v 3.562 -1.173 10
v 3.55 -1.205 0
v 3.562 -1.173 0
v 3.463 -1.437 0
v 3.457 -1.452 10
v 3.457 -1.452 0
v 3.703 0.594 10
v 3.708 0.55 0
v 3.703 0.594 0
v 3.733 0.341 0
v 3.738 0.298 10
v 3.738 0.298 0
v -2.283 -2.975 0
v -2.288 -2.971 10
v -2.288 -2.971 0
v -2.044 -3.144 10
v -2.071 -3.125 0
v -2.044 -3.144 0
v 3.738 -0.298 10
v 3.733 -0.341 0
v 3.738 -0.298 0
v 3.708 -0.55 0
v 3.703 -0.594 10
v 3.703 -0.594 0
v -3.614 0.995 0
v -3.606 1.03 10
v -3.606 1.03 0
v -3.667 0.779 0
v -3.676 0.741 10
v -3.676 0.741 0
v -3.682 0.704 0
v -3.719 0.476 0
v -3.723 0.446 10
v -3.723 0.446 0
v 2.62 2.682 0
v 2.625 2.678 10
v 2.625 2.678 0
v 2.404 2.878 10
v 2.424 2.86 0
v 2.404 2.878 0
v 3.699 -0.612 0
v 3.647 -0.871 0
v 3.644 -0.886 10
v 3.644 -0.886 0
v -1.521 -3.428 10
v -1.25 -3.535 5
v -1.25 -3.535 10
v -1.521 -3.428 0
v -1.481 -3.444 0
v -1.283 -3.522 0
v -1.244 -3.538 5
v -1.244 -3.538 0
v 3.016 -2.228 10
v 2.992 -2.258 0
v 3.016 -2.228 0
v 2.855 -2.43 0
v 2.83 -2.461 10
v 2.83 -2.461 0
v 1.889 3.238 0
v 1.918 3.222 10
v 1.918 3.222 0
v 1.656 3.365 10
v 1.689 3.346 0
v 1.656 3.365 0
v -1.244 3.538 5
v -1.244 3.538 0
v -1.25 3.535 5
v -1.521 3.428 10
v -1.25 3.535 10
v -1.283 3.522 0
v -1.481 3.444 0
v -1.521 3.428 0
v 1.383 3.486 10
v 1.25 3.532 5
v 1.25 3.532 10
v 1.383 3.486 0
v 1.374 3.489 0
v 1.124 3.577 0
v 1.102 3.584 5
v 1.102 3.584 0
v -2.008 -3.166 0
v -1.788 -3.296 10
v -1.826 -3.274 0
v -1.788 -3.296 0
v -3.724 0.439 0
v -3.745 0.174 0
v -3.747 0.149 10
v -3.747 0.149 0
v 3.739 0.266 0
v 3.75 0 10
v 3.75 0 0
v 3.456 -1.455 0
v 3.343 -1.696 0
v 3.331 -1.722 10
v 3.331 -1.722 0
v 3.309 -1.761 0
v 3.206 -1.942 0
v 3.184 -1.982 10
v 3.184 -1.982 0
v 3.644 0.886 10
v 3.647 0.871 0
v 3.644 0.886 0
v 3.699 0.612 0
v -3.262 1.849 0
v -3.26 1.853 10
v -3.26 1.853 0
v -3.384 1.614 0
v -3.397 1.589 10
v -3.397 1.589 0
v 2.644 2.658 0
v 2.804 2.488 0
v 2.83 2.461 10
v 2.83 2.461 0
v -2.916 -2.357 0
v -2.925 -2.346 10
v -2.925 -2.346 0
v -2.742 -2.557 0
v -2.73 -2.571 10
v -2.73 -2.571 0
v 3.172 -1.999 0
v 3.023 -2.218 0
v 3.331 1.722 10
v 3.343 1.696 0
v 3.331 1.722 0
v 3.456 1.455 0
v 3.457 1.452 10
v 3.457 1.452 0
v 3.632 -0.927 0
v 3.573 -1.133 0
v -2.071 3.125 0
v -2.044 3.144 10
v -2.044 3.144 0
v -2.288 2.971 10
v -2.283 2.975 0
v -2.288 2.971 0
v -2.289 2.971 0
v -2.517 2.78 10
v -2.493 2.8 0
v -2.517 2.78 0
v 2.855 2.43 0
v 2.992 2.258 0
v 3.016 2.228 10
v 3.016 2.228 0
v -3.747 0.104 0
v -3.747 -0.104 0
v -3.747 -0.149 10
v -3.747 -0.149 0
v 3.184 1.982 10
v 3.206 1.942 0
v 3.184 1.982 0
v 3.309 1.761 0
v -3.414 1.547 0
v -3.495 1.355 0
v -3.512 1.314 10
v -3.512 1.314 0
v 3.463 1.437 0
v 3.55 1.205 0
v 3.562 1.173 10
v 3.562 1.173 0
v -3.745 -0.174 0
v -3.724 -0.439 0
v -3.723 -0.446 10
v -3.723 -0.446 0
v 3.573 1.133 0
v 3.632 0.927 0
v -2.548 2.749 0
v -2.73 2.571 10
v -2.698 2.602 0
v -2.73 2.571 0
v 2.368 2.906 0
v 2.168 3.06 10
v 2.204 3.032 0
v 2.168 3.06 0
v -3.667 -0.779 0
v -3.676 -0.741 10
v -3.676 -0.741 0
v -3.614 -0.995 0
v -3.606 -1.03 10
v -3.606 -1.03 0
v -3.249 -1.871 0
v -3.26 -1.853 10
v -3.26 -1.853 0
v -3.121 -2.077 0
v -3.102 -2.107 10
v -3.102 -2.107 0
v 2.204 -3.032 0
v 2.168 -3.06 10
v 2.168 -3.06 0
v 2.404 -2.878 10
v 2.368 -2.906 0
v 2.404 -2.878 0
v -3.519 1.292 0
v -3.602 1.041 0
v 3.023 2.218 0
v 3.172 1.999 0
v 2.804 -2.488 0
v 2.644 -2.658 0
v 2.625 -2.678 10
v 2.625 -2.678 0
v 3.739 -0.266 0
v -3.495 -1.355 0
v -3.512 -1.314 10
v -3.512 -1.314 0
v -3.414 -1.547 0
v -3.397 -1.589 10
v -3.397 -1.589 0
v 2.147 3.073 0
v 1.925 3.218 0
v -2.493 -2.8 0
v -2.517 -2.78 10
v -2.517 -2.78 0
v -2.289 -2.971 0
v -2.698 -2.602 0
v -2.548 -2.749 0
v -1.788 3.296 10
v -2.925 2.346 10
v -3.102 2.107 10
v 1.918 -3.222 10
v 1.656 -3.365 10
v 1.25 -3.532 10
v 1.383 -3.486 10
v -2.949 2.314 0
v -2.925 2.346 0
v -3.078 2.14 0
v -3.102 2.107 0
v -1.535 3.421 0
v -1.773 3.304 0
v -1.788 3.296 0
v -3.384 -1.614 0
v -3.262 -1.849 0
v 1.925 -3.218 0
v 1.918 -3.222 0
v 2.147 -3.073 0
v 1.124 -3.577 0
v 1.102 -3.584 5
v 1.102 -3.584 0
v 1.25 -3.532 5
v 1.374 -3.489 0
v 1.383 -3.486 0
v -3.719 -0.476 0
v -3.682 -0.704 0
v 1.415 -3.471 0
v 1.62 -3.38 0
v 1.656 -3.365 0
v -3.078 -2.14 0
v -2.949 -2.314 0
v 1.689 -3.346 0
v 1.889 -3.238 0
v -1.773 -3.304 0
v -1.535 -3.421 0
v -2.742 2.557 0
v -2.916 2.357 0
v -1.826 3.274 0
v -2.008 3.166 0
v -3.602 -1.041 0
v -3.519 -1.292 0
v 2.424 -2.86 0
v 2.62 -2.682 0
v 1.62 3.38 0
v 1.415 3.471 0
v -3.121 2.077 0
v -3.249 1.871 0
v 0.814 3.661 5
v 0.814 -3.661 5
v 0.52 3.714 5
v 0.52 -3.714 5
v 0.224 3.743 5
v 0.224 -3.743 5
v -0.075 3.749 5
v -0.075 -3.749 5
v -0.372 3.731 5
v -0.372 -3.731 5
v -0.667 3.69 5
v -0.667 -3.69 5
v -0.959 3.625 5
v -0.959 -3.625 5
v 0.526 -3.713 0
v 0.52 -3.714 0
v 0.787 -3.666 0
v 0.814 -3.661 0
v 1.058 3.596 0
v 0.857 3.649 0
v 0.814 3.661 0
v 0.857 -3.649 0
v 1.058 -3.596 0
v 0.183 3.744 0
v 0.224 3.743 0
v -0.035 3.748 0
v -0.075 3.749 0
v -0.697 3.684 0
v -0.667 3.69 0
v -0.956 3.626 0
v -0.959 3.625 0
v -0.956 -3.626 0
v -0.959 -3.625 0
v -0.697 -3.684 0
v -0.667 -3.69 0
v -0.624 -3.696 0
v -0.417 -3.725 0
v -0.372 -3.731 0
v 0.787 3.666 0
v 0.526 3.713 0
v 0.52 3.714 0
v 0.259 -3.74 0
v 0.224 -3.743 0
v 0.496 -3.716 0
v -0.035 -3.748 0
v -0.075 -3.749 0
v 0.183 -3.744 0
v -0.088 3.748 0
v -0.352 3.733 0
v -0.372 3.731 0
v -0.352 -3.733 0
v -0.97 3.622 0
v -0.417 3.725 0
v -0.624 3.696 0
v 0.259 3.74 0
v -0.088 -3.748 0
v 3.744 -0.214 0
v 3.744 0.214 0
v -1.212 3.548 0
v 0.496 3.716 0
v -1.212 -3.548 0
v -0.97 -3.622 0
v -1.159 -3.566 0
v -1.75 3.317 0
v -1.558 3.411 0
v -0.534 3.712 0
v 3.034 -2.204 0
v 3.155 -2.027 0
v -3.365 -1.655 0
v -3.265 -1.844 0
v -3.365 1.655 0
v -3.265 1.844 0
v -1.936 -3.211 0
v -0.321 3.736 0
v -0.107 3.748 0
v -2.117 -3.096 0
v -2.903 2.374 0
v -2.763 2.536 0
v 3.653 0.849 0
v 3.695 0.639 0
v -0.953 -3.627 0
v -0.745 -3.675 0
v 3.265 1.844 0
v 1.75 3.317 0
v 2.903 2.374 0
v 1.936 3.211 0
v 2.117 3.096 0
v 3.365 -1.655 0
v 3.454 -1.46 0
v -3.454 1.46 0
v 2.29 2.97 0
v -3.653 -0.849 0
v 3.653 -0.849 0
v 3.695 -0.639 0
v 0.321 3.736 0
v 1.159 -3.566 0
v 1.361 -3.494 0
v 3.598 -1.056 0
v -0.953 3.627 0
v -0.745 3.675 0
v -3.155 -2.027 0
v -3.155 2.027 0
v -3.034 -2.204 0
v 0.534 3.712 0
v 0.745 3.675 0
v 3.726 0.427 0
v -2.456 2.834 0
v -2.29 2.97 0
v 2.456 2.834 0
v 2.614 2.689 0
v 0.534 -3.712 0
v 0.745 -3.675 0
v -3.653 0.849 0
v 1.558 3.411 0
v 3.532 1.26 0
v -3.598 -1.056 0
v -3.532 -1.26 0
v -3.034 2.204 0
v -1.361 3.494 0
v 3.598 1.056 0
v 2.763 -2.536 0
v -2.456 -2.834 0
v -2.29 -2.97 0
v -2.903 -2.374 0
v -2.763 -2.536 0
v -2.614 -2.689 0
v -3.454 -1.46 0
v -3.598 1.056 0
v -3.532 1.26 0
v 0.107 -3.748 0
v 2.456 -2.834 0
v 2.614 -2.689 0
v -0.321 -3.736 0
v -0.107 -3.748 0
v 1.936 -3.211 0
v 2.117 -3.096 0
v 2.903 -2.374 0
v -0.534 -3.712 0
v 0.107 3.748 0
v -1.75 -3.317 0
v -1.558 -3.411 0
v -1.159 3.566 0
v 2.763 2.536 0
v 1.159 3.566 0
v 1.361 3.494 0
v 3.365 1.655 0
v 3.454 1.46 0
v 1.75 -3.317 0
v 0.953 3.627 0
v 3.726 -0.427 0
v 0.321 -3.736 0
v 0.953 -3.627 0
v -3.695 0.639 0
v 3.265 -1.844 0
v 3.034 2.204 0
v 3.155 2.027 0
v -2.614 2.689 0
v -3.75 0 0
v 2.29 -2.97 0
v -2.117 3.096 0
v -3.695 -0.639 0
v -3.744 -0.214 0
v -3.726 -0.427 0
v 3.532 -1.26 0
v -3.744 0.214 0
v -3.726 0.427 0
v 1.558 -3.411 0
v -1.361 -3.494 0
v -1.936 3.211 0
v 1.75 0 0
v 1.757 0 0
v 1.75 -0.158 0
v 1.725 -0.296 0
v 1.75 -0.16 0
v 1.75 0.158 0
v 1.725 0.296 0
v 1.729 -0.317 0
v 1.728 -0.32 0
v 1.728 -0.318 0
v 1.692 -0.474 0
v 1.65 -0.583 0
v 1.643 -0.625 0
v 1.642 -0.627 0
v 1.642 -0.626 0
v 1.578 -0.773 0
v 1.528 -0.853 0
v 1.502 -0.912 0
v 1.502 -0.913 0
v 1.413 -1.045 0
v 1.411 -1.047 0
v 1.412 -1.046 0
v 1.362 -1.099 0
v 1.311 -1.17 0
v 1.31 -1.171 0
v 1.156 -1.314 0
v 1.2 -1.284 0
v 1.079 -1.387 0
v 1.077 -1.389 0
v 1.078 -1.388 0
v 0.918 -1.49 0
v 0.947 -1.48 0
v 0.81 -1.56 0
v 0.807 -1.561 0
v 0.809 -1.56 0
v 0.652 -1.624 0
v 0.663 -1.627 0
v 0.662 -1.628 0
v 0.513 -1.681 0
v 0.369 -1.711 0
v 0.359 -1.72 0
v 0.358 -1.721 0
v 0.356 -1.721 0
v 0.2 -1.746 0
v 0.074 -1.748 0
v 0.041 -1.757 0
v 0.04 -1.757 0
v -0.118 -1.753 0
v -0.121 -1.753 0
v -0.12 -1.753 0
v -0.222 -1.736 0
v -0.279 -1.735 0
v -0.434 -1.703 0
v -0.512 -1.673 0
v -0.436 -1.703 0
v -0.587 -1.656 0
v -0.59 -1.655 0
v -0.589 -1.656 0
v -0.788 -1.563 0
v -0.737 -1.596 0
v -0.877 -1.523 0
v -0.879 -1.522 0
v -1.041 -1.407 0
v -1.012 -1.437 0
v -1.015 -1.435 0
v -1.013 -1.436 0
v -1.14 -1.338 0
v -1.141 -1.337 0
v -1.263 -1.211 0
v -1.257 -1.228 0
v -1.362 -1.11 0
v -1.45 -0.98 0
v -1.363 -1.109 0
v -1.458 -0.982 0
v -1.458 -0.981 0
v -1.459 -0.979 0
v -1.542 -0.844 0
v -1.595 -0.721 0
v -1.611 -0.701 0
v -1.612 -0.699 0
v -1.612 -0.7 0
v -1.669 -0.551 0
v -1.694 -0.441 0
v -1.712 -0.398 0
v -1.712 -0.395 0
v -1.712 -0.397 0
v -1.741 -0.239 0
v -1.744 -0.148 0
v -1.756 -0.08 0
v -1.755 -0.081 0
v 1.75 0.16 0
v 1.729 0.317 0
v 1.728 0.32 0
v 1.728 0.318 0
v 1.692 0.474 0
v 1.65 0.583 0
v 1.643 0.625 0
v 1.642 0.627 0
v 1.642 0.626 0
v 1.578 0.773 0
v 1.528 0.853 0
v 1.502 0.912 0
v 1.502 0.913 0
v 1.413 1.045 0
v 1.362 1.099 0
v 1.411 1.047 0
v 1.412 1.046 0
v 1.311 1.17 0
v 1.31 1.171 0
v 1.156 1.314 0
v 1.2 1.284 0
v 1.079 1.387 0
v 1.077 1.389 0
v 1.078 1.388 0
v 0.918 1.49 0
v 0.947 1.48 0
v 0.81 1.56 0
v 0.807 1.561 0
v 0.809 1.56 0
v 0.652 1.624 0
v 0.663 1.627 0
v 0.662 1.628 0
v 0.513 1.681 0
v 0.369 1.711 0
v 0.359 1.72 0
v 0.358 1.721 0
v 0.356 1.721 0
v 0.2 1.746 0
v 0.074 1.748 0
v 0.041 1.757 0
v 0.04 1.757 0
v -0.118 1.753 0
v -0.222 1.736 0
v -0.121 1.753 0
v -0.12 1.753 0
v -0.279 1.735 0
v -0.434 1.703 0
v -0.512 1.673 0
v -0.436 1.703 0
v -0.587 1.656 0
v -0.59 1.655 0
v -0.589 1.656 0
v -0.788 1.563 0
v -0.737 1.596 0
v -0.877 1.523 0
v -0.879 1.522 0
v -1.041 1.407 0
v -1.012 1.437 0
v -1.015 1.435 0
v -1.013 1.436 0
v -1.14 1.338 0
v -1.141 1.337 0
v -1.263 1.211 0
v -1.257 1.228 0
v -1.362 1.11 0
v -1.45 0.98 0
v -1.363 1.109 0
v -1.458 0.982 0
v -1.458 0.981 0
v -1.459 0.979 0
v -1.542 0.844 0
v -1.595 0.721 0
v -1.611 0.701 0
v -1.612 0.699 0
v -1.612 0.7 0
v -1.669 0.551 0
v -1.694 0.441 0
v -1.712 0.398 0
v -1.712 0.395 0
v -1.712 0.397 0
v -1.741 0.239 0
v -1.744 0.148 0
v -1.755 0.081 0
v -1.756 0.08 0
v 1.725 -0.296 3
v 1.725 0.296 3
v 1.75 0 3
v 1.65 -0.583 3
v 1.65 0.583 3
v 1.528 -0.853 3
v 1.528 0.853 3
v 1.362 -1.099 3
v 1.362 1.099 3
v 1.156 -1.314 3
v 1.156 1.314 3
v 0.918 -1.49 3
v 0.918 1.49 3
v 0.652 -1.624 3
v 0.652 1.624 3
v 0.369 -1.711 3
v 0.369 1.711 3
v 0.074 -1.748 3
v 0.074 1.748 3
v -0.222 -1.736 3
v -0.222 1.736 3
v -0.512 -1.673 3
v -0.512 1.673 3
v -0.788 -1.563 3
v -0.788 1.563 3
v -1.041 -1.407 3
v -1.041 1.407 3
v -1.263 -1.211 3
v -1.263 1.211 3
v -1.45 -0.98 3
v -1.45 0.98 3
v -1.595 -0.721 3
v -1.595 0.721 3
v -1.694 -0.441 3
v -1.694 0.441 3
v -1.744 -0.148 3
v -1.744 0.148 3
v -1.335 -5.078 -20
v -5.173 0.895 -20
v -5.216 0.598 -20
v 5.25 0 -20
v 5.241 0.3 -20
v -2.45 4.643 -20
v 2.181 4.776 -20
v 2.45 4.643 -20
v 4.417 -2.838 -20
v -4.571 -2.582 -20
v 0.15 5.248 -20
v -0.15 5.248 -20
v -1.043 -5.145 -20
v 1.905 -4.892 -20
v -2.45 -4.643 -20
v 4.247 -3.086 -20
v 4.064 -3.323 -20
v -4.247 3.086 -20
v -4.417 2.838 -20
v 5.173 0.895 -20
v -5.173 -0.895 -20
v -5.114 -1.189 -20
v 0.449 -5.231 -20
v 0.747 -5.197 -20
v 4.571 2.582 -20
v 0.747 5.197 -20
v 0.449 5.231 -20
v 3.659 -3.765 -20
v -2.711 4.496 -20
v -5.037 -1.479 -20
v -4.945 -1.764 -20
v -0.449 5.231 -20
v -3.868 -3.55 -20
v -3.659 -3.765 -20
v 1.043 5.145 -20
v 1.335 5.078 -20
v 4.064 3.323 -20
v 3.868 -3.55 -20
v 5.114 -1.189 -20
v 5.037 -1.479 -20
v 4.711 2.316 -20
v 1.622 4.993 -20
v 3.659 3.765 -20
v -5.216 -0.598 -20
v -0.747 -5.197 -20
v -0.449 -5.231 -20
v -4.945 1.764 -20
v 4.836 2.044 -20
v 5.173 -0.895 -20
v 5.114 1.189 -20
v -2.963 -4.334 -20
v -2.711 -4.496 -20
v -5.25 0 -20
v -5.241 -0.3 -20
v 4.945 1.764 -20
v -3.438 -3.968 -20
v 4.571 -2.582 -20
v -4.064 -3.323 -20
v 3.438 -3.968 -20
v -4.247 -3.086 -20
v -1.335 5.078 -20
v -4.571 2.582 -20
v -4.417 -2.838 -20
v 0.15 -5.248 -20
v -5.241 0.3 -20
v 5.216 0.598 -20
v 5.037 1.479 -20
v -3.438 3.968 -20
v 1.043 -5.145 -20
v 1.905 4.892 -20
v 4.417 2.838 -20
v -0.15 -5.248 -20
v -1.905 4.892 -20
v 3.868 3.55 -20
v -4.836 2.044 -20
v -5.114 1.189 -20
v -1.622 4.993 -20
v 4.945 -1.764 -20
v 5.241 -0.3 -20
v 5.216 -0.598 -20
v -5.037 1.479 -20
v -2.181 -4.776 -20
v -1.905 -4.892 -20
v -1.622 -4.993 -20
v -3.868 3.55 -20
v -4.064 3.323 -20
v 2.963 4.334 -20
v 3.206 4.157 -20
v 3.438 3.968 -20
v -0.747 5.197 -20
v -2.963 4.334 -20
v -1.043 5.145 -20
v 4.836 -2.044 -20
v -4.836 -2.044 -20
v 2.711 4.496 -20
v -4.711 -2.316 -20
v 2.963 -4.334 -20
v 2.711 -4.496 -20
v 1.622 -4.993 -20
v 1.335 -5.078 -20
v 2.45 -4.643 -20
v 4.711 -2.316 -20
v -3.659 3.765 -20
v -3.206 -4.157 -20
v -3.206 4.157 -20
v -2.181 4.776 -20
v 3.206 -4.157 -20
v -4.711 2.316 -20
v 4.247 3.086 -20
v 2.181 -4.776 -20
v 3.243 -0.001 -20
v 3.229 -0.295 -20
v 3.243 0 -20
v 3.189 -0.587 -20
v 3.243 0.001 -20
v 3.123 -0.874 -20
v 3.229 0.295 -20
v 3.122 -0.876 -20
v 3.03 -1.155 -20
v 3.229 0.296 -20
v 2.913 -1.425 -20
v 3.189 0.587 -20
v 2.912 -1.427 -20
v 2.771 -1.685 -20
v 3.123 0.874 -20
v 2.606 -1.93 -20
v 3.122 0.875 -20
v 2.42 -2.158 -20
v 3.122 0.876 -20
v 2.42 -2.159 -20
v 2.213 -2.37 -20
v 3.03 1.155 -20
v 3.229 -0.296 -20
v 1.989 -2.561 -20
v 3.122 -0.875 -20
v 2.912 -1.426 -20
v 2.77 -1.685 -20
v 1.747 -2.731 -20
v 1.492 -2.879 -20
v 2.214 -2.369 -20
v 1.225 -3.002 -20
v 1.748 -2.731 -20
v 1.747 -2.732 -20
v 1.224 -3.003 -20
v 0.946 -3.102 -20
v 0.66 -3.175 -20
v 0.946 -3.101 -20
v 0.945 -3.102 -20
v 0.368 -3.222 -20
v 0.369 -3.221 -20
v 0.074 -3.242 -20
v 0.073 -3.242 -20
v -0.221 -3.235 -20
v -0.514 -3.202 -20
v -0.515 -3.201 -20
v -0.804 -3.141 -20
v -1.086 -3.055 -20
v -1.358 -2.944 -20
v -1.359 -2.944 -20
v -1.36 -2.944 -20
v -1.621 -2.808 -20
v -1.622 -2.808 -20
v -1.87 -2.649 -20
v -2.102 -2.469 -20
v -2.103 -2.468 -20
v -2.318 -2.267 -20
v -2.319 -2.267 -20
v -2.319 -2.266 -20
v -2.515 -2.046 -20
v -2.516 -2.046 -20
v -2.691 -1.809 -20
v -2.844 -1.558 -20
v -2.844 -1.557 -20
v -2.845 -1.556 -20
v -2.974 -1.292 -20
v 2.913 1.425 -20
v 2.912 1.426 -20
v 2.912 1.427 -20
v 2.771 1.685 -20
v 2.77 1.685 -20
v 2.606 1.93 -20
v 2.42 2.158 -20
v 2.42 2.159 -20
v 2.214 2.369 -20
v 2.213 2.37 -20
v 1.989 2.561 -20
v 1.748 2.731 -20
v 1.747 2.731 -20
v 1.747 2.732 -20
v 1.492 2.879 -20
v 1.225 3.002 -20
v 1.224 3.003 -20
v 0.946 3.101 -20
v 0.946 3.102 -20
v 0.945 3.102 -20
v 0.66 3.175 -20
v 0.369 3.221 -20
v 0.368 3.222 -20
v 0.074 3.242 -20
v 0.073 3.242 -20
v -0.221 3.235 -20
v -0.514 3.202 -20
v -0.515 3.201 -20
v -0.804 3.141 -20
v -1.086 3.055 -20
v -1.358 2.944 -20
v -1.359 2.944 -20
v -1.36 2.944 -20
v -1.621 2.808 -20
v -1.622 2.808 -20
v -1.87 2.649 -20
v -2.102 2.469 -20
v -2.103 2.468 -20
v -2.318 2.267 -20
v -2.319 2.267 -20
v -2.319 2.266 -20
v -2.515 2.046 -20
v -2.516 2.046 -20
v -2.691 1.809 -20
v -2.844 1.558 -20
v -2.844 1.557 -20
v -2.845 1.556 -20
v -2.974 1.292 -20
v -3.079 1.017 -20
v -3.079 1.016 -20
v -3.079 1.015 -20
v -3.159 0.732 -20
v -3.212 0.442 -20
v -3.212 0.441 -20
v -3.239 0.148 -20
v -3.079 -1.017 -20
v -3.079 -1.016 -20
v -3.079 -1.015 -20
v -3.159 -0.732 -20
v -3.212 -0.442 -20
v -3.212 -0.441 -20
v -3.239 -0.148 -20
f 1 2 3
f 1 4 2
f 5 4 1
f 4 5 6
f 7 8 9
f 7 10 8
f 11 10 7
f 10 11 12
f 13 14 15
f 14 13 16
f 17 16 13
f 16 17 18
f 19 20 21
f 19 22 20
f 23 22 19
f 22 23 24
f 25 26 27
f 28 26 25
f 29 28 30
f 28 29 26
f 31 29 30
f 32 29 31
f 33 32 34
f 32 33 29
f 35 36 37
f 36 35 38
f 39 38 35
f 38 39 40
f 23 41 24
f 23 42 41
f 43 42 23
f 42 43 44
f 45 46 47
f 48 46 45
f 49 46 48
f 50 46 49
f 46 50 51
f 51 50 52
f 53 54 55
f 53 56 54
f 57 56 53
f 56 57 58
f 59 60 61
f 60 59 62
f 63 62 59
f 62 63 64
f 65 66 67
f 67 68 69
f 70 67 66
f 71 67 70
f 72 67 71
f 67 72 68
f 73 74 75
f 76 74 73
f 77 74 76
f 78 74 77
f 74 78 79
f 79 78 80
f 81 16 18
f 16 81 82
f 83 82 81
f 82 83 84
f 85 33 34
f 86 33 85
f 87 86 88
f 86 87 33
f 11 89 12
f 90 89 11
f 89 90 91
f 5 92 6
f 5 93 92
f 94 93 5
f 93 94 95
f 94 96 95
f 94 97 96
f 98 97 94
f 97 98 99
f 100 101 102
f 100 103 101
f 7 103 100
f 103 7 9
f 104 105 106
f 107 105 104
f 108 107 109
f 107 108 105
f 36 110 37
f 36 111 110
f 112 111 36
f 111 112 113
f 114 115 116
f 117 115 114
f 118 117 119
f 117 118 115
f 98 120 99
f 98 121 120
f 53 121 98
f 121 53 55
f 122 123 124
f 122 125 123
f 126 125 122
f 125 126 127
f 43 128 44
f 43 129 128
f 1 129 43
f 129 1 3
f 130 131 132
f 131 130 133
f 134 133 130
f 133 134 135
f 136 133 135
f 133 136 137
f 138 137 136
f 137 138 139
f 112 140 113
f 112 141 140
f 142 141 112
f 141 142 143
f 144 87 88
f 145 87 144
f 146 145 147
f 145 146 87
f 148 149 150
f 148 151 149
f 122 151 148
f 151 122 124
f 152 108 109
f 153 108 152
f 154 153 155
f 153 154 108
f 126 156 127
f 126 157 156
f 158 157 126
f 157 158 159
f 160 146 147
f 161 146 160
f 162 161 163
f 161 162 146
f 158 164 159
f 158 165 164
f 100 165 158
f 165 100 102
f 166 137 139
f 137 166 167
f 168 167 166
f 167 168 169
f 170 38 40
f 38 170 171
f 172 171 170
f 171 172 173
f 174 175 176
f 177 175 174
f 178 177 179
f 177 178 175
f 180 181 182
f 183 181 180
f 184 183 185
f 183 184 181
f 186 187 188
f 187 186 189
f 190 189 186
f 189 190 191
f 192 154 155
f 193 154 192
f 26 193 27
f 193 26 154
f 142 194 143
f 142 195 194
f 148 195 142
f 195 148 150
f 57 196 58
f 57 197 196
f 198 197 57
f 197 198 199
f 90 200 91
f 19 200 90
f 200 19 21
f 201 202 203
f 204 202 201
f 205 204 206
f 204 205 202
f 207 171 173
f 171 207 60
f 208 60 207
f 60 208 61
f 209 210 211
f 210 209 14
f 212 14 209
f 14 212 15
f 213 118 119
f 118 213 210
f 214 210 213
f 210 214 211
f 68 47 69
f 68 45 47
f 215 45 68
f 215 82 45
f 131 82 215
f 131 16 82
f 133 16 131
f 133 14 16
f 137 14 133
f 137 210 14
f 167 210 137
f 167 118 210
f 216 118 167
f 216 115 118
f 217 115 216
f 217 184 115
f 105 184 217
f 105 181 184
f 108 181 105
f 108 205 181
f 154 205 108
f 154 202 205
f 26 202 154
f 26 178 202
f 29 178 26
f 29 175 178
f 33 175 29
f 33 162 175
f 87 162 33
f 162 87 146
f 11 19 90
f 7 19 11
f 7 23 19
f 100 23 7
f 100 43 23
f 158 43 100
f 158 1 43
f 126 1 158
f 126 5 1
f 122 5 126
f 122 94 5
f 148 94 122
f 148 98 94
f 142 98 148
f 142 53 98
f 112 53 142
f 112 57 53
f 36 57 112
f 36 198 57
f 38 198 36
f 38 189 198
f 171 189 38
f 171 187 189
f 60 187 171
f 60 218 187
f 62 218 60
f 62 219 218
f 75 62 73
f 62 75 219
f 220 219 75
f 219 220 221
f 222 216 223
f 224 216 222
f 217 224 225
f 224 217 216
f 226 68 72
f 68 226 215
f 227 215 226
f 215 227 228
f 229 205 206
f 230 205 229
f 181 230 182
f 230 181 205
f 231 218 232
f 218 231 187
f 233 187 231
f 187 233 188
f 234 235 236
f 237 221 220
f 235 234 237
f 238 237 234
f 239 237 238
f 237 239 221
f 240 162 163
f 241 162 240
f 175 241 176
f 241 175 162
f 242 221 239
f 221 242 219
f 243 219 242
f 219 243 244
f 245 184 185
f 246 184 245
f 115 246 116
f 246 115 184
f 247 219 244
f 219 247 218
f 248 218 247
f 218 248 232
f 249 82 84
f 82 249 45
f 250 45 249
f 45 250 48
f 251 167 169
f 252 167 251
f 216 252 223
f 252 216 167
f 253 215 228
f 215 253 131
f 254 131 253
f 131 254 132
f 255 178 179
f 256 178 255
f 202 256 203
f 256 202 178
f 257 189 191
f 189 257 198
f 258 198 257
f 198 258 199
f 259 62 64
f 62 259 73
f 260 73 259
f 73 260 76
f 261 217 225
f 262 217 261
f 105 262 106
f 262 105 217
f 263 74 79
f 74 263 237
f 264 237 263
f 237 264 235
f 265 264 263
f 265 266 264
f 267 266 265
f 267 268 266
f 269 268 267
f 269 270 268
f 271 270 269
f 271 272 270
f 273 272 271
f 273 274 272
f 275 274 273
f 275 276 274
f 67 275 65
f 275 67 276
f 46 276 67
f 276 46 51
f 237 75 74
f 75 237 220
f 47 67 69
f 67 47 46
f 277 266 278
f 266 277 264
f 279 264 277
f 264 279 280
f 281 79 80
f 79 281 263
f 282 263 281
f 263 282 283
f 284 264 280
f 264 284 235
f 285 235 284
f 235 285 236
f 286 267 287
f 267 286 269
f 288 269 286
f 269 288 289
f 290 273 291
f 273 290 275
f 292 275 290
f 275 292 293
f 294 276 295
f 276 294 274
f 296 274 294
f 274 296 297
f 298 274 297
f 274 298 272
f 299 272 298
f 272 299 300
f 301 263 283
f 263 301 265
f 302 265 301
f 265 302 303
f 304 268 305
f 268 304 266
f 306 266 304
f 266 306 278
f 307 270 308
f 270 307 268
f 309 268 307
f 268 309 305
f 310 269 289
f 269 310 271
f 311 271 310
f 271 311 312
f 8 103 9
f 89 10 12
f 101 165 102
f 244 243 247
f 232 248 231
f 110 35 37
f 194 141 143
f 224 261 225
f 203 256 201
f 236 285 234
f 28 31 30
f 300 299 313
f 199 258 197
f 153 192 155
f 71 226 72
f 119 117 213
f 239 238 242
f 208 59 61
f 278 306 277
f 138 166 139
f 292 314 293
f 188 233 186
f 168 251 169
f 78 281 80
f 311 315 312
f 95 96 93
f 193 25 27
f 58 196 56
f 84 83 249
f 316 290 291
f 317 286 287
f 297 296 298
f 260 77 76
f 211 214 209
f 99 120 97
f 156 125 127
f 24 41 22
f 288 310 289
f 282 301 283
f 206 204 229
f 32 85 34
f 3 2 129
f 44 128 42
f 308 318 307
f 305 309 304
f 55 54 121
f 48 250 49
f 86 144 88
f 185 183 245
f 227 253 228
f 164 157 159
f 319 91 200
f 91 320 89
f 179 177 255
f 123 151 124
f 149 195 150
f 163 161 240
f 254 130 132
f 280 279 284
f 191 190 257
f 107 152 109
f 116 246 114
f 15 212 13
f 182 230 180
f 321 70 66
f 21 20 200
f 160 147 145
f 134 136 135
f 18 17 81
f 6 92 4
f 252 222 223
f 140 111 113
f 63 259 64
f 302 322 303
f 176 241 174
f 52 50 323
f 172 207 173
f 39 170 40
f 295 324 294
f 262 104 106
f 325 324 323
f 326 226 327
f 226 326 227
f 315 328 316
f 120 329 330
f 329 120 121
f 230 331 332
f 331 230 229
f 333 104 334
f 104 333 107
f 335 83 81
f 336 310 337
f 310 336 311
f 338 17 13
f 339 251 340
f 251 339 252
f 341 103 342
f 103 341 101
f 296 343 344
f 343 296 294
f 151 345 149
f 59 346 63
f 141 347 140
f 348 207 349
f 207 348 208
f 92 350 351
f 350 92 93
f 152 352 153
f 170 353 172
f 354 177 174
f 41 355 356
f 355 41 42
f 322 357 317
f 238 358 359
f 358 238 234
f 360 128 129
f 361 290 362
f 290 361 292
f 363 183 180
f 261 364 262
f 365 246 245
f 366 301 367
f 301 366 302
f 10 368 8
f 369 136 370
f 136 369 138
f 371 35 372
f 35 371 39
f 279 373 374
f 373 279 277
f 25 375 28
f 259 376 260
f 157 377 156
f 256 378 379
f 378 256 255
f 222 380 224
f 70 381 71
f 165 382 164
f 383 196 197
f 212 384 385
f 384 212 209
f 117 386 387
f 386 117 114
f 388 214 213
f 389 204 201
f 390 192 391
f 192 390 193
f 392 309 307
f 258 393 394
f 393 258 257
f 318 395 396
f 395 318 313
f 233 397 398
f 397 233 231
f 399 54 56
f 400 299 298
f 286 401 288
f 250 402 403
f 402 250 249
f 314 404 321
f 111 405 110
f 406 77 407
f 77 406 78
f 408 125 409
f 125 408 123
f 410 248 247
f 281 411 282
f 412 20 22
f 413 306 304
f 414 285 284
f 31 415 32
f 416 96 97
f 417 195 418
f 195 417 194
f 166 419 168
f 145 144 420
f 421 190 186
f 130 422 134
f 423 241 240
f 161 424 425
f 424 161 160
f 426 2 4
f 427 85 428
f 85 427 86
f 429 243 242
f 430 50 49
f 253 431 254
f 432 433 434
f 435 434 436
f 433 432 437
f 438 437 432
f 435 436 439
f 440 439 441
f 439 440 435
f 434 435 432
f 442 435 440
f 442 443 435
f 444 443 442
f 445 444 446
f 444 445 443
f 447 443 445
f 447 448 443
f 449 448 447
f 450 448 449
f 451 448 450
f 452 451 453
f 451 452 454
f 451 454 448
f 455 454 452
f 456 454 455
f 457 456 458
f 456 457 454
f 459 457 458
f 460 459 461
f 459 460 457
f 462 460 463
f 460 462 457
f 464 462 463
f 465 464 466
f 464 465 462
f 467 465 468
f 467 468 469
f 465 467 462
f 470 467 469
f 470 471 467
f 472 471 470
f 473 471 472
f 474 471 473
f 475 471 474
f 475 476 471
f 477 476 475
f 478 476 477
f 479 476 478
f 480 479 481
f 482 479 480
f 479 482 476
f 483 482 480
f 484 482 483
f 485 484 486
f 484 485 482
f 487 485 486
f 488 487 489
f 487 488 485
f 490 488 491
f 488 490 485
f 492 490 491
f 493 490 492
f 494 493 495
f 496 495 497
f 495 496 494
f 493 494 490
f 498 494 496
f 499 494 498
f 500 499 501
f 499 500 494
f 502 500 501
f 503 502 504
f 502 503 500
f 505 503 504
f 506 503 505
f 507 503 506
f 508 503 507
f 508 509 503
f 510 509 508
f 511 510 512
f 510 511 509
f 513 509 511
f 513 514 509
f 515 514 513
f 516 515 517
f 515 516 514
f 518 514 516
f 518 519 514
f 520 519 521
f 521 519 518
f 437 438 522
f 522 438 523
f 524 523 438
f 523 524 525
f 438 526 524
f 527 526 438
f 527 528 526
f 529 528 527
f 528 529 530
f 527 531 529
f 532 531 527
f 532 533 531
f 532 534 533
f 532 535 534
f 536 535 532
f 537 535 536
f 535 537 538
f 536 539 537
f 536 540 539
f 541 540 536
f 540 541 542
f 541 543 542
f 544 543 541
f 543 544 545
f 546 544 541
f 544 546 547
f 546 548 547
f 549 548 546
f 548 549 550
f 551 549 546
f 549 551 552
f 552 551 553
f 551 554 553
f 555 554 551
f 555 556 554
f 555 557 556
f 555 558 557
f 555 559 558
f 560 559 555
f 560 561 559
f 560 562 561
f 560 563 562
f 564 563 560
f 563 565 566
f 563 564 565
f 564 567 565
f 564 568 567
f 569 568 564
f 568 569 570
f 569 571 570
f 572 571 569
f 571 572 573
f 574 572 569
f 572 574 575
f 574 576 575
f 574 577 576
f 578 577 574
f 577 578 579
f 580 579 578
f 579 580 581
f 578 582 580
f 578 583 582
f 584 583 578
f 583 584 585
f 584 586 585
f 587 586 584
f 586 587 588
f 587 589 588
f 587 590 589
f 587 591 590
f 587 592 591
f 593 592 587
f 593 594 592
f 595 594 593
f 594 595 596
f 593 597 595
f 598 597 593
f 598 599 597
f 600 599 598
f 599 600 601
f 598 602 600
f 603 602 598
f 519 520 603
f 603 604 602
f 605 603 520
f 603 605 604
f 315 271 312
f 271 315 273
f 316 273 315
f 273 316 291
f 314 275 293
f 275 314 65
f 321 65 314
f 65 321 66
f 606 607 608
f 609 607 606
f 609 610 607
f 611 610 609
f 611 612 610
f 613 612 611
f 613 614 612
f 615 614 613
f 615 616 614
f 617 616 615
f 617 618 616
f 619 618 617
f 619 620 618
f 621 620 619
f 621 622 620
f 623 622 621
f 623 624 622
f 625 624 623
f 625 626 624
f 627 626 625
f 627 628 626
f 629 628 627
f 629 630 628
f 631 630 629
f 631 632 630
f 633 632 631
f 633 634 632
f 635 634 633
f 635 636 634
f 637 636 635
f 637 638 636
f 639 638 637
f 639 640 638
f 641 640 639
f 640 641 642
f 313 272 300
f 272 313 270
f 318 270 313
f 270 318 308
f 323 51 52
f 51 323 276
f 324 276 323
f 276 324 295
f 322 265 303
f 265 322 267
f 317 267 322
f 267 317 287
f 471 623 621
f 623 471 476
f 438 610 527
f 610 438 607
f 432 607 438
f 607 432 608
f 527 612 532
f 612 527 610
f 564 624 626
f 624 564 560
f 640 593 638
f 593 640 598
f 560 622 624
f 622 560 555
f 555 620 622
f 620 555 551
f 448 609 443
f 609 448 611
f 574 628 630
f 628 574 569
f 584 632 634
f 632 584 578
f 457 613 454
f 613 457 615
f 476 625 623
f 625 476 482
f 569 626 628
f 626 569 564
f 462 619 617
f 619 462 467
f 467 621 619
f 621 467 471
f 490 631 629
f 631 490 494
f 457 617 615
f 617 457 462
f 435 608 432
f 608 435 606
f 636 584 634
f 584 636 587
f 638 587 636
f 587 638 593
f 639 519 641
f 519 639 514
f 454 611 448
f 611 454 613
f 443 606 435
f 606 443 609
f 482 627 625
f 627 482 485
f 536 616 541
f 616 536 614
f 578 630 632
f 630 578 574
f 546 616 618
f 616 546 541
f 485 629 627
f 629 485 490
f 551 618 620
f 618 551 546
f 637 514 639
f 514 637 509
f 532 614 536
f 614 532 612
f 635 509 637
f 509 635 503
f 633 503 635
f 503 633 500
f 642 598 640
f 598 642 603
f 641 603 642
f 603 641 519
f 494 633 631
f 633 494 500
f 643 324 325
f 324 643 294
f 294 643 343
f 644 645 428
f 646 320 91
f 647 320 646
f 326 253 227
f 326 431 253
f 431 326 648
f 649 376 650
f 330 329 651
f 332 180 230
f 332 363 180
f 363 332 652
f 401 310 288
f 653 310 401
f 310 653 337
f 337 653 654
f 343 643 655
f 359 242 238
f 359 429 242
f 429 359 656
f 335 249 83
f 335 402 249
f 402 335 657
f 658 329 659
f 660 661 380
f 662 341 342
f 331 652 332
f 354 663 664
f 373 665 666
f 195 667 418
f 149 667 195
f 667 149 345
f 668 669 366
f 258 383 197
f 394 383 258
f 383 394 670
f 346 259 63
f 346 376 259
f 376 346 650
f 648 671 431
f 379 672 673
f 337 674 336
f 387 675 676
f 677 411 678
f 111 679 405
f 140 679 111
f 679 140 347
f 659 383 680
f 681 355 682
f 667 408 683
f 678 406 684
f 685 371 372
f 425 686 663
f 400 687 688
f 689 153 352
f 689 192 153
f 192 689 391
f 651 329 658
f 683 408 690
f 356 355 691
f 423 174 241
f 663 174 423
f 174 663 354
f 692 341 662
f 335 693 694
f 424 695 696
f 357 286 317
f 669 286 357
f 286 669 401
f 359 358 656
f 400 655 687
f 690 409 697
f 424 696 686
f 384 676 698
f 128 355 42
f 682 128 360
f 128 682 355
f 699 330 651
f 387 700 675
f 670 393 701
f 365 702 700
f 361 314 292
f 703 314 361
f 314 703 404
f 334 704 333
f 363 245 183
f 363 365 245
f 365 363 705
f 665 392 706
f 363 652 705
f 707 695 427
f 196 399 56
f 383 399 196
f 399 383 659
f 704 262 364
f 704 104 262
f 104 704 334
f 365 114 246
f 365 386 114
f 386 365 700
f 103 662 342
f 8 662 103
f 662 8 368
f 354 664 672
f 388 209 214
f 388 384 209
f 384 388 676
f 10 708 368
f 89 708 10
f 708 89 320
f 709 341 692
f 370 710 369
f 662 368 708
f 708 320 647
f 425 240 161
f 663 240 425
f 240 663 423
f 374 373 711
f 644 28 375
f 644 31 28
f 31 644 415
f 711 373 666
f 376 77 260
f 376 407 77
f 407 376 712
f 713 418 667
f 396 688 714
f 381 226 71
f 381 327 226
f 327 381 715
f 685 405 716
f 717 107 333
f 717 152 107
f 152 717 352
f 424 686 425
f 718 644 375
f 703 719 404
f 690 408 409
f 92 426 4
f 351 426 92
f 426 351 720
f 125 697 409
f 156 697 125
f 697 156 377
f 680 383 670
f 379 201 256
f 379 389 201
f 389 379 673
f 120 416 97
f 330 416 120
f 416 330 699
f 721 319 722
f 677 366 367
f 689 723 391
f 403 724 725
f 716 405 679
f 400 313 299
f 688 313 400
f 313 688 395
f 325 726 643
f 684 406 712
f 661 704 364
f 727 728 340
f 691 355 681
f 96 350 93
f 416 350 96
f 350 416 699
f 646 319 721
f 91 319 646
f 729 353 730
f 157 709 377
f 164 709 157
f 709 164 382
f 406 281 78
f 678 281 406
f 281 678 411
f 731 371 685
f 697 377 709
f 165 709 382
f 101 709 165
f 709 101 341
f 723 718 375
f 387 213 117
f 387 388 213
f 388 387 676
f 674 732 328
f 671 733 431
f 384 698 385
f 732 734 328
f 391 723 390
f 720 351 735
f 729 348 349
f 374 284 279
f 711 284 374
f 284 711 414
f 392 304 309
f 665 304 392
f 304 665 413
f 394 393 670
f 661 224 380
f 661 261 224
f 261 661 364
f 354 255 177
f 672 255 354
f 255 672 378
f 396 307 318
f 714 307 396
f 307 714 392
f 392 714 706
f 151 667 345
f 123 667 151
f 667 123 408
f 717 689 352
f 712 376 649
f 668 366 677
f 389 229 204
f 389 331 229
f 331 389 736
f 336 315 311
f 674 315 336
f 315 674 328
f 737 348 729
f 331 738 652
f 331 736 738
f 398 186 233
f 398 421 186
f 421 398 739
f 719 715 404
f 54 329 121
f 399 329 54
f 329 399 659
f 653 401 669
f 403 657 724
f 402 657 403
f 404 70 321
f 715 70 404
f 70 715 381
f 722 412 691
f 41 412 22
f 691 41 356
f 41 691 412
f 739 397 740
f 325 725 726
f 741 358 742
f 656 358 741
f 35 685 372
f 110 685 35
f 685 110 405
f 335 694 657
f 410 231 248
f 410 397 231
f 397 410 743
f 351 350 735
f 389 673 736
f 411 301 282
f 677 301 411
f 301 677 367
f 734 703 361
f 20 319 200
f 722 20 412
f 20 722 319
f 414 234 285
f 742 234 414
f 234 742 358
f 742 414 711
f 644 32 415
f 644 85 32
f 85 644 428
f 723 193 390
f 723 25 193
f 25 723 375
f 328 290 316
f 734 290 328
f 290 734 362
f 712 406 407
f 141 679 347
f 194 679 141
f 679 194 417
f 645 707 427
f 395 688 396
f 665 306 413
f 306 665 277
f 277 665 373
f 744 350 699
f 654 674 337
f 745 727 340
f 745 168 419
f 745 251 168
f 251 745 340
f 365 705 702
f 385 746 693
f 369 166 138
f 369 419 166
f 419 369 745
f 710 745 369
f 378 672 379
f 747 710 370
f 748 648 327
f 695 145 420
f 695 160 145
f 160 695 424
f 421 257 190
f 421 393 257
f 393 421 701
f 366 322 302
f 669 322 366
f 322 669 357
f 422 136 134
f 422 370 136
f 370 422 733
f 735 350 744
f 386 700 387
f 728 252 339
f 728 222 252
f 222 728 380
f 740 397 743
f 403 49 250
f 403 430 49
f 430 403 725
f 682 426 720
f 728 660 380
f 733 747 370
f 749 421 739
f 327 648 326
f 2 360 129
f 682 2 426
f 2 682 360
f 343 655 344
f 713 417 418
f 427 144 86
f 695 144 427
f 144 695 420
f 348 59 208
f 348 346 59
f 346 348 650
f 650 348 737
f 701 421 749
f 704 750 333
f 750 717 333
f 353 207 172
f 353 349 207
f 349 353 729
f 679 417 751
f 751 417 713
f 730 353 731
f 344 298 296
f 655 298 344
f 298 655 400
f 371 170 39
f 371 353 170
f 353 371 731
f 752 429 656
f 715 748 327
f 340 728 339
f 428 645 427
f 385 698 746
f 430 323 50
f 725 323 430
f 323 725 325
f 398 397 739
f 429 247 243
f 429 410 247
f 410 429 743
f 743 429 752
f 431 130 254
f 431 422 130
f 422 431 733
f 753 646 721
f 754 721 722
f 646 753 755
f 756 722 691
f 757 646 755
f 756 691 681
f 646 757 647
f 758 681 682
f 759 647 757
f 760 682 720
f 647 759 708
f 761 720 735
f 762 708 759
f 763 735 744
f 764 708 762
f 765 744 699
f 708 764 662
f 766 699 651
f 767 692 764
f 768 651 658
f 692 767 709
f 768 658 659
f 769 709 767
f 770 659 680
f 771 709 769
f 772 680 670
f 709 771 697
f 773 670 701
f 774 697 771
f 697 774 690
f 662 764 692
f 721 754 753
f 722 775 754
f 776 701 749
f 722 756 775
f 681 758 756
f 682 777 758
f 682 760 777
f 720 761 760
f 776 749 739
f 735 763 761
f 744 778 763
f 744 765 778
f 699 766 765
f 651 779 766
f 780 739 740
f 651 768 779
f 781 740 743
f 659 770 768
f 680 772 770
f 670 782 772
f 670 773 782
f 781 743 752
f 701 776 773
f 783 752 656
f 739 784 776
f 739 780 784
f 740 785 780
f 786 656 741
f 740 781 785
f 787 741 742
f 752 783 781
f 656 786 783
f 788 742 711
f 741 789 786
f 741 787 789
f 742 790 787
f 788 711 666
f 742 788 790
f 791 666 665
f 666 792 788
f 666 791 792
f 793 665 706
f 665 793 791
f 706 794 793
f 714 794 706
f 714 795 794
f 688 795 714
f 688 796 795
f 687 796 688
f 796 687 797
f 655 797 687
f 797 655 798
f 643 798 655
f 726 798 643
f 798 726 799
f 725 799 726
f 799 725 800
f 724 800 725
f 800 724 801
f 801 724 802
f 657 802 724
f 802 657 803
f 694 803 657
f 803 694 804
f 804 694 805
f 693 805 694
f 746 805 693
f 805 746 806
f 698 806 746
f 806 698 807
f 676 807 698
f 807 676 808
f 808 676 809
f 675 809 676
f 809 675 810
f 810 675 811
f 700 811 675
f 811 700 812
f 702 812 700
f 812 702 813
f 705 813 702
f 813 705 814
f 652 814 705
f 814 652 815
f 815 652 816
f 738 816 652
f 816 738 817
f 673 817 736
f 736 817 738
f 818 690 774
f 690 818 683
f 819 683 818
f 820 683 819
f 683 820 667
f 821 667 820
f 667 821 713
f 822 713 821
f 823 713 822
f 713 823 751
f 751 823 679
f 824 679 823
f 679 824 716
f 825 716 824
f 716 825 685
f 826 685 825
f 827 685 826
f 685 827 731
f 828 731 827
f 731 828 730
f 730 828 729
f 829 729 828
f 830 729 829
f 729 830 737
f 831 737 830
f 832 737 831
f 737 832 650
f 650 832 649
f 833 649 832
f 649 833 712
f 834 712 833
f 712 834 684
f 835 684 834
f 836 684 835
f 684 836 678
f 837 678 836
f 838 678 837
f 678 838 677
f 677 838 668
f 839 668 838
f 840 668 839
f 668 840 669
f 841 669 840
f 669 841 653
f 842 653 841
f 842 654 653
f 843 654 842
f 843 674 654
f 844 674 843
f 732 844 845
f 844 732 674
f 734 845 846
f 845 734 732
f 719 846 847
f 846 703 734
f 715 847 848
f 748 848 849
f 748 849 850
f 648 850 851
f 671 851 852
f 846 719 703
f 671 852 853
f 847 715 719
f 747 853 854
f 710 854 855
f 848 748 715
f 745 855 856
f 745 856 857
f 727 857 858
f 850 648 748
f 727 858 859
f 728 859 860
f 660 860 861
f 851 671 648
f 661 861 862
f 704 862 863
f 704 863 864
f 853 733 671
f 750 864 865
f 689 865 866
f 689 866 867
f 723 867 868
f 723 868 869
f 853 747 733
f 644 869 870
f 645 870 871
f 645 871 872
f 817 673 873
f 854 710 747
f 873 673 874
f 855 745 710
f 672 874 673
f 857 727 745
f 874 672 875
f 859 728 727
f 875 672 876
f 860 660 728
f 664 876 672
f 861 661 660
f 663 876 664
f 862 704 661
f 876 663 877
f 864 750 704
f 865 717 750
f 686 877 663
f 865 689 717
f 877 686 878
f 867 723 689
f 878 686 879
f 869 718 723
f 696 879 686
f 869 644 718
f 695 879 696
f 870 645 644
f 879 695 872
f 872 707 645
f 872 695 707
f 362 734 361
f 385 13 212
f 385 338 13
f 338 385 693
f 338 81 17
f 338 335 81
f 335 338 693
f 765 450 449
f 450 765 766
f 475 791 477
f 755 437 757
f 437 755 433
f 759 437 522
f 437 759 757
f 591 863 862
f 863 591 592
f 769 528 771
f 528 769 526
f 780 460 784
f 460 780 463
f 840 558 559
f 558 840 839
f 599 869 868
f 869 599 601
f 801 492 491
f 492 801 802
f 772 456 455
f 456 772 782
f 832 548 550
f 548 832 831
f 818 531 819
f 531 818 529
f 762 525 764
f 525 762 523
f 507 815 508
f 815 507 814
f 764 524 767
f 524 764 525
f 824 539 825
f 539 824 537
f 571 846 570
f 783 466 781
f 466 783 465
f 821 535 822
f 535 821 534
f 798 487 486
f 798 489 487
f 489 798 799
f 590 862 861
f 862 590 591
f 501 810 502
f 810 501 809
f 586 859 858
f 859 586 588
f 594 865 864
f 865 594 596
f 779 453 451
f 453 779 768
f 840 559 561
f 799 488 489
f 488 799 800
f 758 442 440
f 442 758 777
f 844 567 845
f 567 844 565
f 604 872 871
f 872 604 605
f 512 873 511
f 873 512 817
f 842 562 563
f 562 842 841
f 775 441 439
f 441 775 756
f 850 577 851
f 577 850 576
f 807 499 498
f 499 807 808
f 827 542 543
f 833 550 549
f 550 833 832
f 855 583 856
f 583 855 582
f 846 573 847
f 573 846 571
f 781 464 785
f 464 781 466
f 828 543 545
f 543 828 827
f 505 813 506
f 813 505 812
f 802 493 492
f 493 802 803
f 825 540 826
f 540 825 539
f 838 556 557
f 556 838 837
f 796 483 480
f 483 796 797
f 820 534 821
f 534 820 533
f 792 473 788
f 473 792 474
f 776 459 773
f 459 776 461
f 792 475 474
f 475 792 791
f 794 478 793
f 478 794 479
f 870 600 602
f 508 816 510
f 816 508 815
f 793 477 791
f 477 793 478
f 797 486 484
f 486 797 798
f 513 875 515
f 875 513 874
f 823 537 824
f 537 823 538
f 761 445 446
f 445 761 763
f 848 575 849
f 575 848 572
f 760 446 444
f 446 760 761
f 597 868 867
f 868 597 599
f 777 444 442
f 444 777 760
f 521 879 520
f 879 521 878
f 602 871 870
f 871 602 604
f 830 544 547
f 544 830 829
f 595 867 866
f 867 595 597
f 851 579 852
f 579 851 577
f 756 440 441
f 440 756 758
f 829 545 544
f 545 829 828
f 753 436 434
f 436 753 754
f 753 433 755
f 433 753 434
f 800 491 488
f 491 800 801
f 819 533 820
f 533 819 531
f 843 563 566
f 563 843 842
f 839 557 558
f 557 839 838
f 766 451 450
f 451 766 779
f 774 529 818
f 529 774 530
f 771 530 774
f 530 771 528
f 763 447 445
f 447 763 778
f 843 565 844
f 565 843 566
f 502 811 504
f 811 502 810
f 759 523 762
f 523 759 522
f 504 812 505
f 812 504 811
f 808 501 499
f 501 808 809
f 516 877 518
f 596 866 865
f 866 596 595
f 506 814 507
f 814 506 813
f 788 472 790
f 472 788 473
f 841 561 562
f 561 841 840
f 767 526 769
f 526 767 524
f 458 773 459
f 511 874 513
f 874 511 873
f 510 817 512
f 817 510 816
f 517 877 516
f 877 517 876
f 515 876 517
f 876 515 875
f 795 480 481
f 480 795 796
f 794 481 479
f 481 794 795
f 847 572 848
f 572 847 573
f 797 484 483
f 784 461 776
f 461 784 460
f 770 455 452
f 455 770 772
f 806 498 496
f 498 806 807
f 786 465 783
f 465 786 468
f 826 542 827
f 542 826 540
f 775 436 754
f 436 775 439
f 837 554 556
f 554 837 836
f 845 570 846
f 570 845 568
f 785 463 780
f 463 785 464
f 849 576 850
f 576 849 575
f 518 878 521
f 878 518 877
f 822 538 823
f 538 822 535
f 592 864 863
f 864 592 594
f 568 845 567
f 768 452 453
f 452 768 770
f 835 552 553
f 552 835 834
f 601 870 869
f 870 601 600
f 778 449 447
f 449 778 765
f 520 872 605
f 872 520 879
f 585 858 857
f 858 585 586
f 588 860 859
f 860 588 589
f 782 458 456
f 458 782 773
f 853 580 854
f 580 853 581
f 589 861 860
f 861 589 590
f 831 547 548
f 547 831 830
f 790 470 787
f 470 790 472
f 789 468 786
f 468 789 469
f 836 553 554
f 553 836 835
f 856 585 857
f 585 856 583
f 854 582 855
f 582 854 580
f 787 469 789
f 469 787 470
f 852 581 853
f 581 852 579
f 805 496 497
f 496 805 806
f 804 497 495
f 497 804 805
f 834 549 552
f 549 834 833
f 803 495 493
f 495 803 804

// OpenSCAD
// Oiler nozzle cap with rubber band
// by György Balássy 2016 (http://gyorgybalassy.wordpress.com)
// http://www.thingiverse.com/thing:2014720

// The thickness of the wall in mm.
wallThickness = 2;

// The inner diameter of the top, rubber band holder section (dark blue) in mm.
topDiameter = 3.5;

// The height of the top, rubber band holder section (dark blue) in mm.
topHeight = 5;

// The inner diameter of the central section (dark blue) in mm.
middleDiameter = 3.5;

// The height of the central section (dark blue) in mm.
middleHeight = 3;

// The inner diameter of the bottom section (light blue) in mm.
bottomDiameter = 6.5;

// The height of the bottom section (light blue) in mm.
bottomHeight = 20;

/* [Hidden] */

capHeight = wallThickness;

mainColor = [0.117, 0.565, 1];      // DodgerBlue: RGB(30, 144, 255)
highlightColor = [0.384, 0.726, 1]; // Lighter DodgerBlue: RGB(98, 185, 255)

$fa = 0.3;     // Default minimum facet angle.
$fs = 0.3;     // Default minimum facet size.
delta = 0.1;   // Ensures that no faces remains after boolean operations.

// Top section.
color(mainColor) {
  difference() {
    translate([0, 0, middleHeight + capHeight])
      cylinder(d1 = topDiameter + 2 * wallThickness, d2 = topDiameter + 2 * wallThickness, h = topHeight);
    
    translate([-(topDiameter + 2 * wallThickness) / 3 / 2, -(topDiameter + 2 * wallThickness) / 2, middleHeight + wallThickness - delta])
      cube([(topDiameter + 2 * wallThickness) / 3, topDiameter + 2 * wallThickness + 2 * delta, topHeight + 2 * delta]);
  }
}

// Cap.
color(highlightColor) {  
  translate([0, 0, middleHeight])
    cylinder(d1 = middleDiameter + 2 * wallThickness, d2 = topDiameter + 2 * wallThickness, h = capHeight);
}

// Middle section.
color(mainColor) {
  tube(middleDiameter, topDiameter, wallThickness, middleHeight);
}  

// Bottom section.
color(highlightColor) {
  translate([0, 0, -bottomHeight])
    tube(bottomDiameter, middleDiameter, wallThickness, bottomHeight);
} 

module tube(bottomInnerDiameter, topInnerDiameter, wallThickness, height) {
  difference() {   
    cylinder(d1 = bottomInnerDiameter + 2 * wallThickness, d2 = topInnerDiameter + 2 * wallThickness, h = height);  // Outer
    translate([0, 0, -delta])
      cylinder(d1 = bottomInnerDiameter, d2 = topInnerDiameter, h = height + 2 * delta);  // Inner
  }  
}
